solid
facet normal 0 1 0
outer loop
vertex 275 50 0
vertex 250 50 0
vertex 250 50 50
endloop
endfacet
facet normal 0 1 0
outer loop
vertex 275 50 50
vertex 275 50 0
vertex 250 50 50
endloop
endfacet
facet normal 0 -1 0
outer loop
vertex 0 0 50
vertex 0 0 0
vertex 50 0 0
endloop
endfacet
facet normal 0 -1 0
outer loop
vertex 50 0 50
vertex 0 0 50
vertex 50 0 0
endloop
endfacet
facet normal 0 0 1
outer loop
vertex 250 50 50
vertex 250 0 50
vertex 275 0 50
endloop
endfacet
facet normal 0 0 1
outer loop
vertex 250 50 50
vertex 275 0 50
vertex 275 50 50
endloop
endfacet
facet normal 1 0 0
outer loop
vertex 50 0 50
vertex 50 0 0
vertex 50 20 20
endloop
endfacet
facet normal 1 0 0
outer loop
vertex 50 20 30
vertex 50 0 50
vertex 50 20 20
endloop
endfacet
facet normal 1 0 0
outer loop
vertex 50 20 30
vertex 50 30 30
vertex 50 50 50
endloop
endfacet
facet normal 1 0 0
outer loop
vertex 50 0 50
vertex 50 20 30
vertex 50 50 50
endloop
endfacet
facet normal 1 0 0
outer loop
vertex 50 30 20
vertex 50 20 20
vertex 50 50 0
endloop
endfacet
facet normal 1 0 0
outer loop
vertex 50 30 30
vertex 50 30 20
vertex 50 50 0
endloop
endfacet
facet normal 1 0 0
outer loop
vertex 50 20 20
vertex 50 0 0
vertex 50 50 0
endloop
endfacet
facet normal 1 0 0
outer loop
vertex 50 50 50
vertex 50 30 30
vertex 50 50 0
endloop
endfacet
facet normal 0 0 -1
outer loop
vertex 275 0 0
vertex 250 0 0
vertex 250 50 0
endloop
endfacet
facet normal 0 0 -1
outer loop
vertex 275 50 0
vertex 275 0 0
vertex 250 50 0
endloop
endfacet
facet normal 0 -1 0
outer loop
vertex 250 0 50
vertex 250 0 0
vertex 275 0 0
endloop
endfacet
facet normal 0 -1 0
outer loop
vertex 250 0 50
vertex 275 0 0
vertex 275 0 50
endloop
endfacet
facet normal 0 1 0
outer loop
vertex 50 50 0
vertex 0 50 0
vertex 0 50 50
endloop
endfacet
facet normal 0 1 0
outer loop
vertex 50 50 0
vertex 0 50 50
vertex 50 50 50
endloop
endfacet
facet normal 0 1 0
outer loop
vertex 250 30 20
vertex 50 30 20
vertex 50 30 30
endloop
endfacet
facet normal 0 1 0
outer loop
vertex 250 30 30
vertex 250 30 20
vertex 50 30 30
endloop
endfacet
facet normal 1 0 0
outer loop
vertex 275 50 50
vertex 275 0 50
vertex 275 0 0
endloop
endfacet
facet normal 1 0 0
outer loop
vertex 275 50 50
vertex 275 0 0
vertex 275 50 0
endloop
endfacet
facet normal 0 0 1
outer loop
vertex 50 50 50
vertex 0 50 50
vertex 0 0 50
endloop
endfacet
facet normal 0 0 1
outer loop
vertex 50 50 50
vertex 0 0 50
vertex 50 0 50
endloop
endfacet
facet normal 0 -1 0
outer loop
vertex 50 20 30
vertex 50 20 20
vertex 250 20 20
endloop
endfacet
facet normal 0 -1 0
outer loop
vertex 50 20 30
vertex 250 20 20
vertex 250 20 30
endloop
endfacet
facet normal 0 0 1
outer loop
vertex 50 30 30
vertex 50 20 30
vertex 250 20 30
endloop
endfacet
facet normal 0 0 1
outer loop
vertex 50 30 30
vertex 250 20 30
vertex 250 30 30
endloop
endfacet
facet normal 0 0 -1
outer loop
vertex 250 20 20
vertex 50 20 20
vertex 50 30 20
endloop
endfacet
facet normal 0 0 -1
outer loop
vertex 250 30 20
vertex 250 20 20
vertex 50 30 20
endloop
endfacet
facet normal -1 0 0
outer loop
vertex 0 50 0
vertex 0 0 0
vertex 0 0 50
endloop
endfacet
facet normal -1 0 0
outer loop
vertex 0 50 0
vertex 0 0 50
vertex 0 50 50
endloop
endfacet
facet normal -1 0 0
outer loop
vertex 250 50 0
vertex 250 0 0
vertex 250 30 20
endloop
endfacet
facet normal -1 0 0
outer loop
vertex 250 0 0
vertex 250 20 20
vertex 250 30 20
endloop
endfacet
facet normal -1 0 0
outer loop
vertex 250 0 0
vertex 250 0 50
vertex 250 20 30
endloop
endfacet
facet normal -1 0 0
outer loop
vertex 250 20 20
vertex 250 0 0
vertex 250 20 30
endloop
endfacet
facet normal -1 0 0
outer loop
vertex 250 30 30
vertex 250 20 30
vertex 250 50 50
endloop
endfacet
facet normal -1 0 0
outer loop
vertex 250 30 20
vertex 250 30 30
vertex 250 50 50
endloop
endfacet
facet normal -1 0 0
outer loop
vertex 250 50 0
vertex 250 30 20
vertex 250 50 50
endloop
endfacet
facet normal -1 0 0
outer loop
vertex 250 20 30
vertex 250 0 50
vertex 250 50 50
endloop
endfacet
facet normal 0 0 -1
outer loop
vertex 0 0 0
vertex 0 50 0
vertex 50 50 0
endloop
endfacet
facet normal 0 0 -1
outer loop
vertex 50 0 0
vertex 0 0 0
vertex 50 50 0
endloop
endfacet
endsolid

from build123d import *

# Parameters (mm, degrees)
F0_W     = 50
F0_H     = 50
F1_DEPTH = 50
F2_W     = 10
F2_H     = 10
F3_DEPTH = 200
F4_W     = 50
F4_H     = 50
F5_DEPTH = 25


# Not quite as in the source:
# - a feature names something its author has since deleted; it is built from what else it names


with BuildPart() as f1:
    # F0 (on Top) → F1 (new body)
    with BuildSketch(Plane.XY):
        with Locations((25, 25)):
            Rectangle(F0_W, F0_H)
    extrude(amount=F1_DEPTH)

    # F2 (on face) → F3 (join)
    with BuildSketch(Plane.YZ.offset(50)):
        with Locations((25, 25)):
            Rectangle(F2_W, F2_H)
    extrude(amount=F3_DEPTH)

    # F4 (on face) → F5 (join)
    with BuildSketch(Plane.YZ.offset(250)):
        with Locations((25, 25)):
            Rectangle(F4_W, F4_H)
    extrude(amount=F5_DEPTH)


solid = f1.part
